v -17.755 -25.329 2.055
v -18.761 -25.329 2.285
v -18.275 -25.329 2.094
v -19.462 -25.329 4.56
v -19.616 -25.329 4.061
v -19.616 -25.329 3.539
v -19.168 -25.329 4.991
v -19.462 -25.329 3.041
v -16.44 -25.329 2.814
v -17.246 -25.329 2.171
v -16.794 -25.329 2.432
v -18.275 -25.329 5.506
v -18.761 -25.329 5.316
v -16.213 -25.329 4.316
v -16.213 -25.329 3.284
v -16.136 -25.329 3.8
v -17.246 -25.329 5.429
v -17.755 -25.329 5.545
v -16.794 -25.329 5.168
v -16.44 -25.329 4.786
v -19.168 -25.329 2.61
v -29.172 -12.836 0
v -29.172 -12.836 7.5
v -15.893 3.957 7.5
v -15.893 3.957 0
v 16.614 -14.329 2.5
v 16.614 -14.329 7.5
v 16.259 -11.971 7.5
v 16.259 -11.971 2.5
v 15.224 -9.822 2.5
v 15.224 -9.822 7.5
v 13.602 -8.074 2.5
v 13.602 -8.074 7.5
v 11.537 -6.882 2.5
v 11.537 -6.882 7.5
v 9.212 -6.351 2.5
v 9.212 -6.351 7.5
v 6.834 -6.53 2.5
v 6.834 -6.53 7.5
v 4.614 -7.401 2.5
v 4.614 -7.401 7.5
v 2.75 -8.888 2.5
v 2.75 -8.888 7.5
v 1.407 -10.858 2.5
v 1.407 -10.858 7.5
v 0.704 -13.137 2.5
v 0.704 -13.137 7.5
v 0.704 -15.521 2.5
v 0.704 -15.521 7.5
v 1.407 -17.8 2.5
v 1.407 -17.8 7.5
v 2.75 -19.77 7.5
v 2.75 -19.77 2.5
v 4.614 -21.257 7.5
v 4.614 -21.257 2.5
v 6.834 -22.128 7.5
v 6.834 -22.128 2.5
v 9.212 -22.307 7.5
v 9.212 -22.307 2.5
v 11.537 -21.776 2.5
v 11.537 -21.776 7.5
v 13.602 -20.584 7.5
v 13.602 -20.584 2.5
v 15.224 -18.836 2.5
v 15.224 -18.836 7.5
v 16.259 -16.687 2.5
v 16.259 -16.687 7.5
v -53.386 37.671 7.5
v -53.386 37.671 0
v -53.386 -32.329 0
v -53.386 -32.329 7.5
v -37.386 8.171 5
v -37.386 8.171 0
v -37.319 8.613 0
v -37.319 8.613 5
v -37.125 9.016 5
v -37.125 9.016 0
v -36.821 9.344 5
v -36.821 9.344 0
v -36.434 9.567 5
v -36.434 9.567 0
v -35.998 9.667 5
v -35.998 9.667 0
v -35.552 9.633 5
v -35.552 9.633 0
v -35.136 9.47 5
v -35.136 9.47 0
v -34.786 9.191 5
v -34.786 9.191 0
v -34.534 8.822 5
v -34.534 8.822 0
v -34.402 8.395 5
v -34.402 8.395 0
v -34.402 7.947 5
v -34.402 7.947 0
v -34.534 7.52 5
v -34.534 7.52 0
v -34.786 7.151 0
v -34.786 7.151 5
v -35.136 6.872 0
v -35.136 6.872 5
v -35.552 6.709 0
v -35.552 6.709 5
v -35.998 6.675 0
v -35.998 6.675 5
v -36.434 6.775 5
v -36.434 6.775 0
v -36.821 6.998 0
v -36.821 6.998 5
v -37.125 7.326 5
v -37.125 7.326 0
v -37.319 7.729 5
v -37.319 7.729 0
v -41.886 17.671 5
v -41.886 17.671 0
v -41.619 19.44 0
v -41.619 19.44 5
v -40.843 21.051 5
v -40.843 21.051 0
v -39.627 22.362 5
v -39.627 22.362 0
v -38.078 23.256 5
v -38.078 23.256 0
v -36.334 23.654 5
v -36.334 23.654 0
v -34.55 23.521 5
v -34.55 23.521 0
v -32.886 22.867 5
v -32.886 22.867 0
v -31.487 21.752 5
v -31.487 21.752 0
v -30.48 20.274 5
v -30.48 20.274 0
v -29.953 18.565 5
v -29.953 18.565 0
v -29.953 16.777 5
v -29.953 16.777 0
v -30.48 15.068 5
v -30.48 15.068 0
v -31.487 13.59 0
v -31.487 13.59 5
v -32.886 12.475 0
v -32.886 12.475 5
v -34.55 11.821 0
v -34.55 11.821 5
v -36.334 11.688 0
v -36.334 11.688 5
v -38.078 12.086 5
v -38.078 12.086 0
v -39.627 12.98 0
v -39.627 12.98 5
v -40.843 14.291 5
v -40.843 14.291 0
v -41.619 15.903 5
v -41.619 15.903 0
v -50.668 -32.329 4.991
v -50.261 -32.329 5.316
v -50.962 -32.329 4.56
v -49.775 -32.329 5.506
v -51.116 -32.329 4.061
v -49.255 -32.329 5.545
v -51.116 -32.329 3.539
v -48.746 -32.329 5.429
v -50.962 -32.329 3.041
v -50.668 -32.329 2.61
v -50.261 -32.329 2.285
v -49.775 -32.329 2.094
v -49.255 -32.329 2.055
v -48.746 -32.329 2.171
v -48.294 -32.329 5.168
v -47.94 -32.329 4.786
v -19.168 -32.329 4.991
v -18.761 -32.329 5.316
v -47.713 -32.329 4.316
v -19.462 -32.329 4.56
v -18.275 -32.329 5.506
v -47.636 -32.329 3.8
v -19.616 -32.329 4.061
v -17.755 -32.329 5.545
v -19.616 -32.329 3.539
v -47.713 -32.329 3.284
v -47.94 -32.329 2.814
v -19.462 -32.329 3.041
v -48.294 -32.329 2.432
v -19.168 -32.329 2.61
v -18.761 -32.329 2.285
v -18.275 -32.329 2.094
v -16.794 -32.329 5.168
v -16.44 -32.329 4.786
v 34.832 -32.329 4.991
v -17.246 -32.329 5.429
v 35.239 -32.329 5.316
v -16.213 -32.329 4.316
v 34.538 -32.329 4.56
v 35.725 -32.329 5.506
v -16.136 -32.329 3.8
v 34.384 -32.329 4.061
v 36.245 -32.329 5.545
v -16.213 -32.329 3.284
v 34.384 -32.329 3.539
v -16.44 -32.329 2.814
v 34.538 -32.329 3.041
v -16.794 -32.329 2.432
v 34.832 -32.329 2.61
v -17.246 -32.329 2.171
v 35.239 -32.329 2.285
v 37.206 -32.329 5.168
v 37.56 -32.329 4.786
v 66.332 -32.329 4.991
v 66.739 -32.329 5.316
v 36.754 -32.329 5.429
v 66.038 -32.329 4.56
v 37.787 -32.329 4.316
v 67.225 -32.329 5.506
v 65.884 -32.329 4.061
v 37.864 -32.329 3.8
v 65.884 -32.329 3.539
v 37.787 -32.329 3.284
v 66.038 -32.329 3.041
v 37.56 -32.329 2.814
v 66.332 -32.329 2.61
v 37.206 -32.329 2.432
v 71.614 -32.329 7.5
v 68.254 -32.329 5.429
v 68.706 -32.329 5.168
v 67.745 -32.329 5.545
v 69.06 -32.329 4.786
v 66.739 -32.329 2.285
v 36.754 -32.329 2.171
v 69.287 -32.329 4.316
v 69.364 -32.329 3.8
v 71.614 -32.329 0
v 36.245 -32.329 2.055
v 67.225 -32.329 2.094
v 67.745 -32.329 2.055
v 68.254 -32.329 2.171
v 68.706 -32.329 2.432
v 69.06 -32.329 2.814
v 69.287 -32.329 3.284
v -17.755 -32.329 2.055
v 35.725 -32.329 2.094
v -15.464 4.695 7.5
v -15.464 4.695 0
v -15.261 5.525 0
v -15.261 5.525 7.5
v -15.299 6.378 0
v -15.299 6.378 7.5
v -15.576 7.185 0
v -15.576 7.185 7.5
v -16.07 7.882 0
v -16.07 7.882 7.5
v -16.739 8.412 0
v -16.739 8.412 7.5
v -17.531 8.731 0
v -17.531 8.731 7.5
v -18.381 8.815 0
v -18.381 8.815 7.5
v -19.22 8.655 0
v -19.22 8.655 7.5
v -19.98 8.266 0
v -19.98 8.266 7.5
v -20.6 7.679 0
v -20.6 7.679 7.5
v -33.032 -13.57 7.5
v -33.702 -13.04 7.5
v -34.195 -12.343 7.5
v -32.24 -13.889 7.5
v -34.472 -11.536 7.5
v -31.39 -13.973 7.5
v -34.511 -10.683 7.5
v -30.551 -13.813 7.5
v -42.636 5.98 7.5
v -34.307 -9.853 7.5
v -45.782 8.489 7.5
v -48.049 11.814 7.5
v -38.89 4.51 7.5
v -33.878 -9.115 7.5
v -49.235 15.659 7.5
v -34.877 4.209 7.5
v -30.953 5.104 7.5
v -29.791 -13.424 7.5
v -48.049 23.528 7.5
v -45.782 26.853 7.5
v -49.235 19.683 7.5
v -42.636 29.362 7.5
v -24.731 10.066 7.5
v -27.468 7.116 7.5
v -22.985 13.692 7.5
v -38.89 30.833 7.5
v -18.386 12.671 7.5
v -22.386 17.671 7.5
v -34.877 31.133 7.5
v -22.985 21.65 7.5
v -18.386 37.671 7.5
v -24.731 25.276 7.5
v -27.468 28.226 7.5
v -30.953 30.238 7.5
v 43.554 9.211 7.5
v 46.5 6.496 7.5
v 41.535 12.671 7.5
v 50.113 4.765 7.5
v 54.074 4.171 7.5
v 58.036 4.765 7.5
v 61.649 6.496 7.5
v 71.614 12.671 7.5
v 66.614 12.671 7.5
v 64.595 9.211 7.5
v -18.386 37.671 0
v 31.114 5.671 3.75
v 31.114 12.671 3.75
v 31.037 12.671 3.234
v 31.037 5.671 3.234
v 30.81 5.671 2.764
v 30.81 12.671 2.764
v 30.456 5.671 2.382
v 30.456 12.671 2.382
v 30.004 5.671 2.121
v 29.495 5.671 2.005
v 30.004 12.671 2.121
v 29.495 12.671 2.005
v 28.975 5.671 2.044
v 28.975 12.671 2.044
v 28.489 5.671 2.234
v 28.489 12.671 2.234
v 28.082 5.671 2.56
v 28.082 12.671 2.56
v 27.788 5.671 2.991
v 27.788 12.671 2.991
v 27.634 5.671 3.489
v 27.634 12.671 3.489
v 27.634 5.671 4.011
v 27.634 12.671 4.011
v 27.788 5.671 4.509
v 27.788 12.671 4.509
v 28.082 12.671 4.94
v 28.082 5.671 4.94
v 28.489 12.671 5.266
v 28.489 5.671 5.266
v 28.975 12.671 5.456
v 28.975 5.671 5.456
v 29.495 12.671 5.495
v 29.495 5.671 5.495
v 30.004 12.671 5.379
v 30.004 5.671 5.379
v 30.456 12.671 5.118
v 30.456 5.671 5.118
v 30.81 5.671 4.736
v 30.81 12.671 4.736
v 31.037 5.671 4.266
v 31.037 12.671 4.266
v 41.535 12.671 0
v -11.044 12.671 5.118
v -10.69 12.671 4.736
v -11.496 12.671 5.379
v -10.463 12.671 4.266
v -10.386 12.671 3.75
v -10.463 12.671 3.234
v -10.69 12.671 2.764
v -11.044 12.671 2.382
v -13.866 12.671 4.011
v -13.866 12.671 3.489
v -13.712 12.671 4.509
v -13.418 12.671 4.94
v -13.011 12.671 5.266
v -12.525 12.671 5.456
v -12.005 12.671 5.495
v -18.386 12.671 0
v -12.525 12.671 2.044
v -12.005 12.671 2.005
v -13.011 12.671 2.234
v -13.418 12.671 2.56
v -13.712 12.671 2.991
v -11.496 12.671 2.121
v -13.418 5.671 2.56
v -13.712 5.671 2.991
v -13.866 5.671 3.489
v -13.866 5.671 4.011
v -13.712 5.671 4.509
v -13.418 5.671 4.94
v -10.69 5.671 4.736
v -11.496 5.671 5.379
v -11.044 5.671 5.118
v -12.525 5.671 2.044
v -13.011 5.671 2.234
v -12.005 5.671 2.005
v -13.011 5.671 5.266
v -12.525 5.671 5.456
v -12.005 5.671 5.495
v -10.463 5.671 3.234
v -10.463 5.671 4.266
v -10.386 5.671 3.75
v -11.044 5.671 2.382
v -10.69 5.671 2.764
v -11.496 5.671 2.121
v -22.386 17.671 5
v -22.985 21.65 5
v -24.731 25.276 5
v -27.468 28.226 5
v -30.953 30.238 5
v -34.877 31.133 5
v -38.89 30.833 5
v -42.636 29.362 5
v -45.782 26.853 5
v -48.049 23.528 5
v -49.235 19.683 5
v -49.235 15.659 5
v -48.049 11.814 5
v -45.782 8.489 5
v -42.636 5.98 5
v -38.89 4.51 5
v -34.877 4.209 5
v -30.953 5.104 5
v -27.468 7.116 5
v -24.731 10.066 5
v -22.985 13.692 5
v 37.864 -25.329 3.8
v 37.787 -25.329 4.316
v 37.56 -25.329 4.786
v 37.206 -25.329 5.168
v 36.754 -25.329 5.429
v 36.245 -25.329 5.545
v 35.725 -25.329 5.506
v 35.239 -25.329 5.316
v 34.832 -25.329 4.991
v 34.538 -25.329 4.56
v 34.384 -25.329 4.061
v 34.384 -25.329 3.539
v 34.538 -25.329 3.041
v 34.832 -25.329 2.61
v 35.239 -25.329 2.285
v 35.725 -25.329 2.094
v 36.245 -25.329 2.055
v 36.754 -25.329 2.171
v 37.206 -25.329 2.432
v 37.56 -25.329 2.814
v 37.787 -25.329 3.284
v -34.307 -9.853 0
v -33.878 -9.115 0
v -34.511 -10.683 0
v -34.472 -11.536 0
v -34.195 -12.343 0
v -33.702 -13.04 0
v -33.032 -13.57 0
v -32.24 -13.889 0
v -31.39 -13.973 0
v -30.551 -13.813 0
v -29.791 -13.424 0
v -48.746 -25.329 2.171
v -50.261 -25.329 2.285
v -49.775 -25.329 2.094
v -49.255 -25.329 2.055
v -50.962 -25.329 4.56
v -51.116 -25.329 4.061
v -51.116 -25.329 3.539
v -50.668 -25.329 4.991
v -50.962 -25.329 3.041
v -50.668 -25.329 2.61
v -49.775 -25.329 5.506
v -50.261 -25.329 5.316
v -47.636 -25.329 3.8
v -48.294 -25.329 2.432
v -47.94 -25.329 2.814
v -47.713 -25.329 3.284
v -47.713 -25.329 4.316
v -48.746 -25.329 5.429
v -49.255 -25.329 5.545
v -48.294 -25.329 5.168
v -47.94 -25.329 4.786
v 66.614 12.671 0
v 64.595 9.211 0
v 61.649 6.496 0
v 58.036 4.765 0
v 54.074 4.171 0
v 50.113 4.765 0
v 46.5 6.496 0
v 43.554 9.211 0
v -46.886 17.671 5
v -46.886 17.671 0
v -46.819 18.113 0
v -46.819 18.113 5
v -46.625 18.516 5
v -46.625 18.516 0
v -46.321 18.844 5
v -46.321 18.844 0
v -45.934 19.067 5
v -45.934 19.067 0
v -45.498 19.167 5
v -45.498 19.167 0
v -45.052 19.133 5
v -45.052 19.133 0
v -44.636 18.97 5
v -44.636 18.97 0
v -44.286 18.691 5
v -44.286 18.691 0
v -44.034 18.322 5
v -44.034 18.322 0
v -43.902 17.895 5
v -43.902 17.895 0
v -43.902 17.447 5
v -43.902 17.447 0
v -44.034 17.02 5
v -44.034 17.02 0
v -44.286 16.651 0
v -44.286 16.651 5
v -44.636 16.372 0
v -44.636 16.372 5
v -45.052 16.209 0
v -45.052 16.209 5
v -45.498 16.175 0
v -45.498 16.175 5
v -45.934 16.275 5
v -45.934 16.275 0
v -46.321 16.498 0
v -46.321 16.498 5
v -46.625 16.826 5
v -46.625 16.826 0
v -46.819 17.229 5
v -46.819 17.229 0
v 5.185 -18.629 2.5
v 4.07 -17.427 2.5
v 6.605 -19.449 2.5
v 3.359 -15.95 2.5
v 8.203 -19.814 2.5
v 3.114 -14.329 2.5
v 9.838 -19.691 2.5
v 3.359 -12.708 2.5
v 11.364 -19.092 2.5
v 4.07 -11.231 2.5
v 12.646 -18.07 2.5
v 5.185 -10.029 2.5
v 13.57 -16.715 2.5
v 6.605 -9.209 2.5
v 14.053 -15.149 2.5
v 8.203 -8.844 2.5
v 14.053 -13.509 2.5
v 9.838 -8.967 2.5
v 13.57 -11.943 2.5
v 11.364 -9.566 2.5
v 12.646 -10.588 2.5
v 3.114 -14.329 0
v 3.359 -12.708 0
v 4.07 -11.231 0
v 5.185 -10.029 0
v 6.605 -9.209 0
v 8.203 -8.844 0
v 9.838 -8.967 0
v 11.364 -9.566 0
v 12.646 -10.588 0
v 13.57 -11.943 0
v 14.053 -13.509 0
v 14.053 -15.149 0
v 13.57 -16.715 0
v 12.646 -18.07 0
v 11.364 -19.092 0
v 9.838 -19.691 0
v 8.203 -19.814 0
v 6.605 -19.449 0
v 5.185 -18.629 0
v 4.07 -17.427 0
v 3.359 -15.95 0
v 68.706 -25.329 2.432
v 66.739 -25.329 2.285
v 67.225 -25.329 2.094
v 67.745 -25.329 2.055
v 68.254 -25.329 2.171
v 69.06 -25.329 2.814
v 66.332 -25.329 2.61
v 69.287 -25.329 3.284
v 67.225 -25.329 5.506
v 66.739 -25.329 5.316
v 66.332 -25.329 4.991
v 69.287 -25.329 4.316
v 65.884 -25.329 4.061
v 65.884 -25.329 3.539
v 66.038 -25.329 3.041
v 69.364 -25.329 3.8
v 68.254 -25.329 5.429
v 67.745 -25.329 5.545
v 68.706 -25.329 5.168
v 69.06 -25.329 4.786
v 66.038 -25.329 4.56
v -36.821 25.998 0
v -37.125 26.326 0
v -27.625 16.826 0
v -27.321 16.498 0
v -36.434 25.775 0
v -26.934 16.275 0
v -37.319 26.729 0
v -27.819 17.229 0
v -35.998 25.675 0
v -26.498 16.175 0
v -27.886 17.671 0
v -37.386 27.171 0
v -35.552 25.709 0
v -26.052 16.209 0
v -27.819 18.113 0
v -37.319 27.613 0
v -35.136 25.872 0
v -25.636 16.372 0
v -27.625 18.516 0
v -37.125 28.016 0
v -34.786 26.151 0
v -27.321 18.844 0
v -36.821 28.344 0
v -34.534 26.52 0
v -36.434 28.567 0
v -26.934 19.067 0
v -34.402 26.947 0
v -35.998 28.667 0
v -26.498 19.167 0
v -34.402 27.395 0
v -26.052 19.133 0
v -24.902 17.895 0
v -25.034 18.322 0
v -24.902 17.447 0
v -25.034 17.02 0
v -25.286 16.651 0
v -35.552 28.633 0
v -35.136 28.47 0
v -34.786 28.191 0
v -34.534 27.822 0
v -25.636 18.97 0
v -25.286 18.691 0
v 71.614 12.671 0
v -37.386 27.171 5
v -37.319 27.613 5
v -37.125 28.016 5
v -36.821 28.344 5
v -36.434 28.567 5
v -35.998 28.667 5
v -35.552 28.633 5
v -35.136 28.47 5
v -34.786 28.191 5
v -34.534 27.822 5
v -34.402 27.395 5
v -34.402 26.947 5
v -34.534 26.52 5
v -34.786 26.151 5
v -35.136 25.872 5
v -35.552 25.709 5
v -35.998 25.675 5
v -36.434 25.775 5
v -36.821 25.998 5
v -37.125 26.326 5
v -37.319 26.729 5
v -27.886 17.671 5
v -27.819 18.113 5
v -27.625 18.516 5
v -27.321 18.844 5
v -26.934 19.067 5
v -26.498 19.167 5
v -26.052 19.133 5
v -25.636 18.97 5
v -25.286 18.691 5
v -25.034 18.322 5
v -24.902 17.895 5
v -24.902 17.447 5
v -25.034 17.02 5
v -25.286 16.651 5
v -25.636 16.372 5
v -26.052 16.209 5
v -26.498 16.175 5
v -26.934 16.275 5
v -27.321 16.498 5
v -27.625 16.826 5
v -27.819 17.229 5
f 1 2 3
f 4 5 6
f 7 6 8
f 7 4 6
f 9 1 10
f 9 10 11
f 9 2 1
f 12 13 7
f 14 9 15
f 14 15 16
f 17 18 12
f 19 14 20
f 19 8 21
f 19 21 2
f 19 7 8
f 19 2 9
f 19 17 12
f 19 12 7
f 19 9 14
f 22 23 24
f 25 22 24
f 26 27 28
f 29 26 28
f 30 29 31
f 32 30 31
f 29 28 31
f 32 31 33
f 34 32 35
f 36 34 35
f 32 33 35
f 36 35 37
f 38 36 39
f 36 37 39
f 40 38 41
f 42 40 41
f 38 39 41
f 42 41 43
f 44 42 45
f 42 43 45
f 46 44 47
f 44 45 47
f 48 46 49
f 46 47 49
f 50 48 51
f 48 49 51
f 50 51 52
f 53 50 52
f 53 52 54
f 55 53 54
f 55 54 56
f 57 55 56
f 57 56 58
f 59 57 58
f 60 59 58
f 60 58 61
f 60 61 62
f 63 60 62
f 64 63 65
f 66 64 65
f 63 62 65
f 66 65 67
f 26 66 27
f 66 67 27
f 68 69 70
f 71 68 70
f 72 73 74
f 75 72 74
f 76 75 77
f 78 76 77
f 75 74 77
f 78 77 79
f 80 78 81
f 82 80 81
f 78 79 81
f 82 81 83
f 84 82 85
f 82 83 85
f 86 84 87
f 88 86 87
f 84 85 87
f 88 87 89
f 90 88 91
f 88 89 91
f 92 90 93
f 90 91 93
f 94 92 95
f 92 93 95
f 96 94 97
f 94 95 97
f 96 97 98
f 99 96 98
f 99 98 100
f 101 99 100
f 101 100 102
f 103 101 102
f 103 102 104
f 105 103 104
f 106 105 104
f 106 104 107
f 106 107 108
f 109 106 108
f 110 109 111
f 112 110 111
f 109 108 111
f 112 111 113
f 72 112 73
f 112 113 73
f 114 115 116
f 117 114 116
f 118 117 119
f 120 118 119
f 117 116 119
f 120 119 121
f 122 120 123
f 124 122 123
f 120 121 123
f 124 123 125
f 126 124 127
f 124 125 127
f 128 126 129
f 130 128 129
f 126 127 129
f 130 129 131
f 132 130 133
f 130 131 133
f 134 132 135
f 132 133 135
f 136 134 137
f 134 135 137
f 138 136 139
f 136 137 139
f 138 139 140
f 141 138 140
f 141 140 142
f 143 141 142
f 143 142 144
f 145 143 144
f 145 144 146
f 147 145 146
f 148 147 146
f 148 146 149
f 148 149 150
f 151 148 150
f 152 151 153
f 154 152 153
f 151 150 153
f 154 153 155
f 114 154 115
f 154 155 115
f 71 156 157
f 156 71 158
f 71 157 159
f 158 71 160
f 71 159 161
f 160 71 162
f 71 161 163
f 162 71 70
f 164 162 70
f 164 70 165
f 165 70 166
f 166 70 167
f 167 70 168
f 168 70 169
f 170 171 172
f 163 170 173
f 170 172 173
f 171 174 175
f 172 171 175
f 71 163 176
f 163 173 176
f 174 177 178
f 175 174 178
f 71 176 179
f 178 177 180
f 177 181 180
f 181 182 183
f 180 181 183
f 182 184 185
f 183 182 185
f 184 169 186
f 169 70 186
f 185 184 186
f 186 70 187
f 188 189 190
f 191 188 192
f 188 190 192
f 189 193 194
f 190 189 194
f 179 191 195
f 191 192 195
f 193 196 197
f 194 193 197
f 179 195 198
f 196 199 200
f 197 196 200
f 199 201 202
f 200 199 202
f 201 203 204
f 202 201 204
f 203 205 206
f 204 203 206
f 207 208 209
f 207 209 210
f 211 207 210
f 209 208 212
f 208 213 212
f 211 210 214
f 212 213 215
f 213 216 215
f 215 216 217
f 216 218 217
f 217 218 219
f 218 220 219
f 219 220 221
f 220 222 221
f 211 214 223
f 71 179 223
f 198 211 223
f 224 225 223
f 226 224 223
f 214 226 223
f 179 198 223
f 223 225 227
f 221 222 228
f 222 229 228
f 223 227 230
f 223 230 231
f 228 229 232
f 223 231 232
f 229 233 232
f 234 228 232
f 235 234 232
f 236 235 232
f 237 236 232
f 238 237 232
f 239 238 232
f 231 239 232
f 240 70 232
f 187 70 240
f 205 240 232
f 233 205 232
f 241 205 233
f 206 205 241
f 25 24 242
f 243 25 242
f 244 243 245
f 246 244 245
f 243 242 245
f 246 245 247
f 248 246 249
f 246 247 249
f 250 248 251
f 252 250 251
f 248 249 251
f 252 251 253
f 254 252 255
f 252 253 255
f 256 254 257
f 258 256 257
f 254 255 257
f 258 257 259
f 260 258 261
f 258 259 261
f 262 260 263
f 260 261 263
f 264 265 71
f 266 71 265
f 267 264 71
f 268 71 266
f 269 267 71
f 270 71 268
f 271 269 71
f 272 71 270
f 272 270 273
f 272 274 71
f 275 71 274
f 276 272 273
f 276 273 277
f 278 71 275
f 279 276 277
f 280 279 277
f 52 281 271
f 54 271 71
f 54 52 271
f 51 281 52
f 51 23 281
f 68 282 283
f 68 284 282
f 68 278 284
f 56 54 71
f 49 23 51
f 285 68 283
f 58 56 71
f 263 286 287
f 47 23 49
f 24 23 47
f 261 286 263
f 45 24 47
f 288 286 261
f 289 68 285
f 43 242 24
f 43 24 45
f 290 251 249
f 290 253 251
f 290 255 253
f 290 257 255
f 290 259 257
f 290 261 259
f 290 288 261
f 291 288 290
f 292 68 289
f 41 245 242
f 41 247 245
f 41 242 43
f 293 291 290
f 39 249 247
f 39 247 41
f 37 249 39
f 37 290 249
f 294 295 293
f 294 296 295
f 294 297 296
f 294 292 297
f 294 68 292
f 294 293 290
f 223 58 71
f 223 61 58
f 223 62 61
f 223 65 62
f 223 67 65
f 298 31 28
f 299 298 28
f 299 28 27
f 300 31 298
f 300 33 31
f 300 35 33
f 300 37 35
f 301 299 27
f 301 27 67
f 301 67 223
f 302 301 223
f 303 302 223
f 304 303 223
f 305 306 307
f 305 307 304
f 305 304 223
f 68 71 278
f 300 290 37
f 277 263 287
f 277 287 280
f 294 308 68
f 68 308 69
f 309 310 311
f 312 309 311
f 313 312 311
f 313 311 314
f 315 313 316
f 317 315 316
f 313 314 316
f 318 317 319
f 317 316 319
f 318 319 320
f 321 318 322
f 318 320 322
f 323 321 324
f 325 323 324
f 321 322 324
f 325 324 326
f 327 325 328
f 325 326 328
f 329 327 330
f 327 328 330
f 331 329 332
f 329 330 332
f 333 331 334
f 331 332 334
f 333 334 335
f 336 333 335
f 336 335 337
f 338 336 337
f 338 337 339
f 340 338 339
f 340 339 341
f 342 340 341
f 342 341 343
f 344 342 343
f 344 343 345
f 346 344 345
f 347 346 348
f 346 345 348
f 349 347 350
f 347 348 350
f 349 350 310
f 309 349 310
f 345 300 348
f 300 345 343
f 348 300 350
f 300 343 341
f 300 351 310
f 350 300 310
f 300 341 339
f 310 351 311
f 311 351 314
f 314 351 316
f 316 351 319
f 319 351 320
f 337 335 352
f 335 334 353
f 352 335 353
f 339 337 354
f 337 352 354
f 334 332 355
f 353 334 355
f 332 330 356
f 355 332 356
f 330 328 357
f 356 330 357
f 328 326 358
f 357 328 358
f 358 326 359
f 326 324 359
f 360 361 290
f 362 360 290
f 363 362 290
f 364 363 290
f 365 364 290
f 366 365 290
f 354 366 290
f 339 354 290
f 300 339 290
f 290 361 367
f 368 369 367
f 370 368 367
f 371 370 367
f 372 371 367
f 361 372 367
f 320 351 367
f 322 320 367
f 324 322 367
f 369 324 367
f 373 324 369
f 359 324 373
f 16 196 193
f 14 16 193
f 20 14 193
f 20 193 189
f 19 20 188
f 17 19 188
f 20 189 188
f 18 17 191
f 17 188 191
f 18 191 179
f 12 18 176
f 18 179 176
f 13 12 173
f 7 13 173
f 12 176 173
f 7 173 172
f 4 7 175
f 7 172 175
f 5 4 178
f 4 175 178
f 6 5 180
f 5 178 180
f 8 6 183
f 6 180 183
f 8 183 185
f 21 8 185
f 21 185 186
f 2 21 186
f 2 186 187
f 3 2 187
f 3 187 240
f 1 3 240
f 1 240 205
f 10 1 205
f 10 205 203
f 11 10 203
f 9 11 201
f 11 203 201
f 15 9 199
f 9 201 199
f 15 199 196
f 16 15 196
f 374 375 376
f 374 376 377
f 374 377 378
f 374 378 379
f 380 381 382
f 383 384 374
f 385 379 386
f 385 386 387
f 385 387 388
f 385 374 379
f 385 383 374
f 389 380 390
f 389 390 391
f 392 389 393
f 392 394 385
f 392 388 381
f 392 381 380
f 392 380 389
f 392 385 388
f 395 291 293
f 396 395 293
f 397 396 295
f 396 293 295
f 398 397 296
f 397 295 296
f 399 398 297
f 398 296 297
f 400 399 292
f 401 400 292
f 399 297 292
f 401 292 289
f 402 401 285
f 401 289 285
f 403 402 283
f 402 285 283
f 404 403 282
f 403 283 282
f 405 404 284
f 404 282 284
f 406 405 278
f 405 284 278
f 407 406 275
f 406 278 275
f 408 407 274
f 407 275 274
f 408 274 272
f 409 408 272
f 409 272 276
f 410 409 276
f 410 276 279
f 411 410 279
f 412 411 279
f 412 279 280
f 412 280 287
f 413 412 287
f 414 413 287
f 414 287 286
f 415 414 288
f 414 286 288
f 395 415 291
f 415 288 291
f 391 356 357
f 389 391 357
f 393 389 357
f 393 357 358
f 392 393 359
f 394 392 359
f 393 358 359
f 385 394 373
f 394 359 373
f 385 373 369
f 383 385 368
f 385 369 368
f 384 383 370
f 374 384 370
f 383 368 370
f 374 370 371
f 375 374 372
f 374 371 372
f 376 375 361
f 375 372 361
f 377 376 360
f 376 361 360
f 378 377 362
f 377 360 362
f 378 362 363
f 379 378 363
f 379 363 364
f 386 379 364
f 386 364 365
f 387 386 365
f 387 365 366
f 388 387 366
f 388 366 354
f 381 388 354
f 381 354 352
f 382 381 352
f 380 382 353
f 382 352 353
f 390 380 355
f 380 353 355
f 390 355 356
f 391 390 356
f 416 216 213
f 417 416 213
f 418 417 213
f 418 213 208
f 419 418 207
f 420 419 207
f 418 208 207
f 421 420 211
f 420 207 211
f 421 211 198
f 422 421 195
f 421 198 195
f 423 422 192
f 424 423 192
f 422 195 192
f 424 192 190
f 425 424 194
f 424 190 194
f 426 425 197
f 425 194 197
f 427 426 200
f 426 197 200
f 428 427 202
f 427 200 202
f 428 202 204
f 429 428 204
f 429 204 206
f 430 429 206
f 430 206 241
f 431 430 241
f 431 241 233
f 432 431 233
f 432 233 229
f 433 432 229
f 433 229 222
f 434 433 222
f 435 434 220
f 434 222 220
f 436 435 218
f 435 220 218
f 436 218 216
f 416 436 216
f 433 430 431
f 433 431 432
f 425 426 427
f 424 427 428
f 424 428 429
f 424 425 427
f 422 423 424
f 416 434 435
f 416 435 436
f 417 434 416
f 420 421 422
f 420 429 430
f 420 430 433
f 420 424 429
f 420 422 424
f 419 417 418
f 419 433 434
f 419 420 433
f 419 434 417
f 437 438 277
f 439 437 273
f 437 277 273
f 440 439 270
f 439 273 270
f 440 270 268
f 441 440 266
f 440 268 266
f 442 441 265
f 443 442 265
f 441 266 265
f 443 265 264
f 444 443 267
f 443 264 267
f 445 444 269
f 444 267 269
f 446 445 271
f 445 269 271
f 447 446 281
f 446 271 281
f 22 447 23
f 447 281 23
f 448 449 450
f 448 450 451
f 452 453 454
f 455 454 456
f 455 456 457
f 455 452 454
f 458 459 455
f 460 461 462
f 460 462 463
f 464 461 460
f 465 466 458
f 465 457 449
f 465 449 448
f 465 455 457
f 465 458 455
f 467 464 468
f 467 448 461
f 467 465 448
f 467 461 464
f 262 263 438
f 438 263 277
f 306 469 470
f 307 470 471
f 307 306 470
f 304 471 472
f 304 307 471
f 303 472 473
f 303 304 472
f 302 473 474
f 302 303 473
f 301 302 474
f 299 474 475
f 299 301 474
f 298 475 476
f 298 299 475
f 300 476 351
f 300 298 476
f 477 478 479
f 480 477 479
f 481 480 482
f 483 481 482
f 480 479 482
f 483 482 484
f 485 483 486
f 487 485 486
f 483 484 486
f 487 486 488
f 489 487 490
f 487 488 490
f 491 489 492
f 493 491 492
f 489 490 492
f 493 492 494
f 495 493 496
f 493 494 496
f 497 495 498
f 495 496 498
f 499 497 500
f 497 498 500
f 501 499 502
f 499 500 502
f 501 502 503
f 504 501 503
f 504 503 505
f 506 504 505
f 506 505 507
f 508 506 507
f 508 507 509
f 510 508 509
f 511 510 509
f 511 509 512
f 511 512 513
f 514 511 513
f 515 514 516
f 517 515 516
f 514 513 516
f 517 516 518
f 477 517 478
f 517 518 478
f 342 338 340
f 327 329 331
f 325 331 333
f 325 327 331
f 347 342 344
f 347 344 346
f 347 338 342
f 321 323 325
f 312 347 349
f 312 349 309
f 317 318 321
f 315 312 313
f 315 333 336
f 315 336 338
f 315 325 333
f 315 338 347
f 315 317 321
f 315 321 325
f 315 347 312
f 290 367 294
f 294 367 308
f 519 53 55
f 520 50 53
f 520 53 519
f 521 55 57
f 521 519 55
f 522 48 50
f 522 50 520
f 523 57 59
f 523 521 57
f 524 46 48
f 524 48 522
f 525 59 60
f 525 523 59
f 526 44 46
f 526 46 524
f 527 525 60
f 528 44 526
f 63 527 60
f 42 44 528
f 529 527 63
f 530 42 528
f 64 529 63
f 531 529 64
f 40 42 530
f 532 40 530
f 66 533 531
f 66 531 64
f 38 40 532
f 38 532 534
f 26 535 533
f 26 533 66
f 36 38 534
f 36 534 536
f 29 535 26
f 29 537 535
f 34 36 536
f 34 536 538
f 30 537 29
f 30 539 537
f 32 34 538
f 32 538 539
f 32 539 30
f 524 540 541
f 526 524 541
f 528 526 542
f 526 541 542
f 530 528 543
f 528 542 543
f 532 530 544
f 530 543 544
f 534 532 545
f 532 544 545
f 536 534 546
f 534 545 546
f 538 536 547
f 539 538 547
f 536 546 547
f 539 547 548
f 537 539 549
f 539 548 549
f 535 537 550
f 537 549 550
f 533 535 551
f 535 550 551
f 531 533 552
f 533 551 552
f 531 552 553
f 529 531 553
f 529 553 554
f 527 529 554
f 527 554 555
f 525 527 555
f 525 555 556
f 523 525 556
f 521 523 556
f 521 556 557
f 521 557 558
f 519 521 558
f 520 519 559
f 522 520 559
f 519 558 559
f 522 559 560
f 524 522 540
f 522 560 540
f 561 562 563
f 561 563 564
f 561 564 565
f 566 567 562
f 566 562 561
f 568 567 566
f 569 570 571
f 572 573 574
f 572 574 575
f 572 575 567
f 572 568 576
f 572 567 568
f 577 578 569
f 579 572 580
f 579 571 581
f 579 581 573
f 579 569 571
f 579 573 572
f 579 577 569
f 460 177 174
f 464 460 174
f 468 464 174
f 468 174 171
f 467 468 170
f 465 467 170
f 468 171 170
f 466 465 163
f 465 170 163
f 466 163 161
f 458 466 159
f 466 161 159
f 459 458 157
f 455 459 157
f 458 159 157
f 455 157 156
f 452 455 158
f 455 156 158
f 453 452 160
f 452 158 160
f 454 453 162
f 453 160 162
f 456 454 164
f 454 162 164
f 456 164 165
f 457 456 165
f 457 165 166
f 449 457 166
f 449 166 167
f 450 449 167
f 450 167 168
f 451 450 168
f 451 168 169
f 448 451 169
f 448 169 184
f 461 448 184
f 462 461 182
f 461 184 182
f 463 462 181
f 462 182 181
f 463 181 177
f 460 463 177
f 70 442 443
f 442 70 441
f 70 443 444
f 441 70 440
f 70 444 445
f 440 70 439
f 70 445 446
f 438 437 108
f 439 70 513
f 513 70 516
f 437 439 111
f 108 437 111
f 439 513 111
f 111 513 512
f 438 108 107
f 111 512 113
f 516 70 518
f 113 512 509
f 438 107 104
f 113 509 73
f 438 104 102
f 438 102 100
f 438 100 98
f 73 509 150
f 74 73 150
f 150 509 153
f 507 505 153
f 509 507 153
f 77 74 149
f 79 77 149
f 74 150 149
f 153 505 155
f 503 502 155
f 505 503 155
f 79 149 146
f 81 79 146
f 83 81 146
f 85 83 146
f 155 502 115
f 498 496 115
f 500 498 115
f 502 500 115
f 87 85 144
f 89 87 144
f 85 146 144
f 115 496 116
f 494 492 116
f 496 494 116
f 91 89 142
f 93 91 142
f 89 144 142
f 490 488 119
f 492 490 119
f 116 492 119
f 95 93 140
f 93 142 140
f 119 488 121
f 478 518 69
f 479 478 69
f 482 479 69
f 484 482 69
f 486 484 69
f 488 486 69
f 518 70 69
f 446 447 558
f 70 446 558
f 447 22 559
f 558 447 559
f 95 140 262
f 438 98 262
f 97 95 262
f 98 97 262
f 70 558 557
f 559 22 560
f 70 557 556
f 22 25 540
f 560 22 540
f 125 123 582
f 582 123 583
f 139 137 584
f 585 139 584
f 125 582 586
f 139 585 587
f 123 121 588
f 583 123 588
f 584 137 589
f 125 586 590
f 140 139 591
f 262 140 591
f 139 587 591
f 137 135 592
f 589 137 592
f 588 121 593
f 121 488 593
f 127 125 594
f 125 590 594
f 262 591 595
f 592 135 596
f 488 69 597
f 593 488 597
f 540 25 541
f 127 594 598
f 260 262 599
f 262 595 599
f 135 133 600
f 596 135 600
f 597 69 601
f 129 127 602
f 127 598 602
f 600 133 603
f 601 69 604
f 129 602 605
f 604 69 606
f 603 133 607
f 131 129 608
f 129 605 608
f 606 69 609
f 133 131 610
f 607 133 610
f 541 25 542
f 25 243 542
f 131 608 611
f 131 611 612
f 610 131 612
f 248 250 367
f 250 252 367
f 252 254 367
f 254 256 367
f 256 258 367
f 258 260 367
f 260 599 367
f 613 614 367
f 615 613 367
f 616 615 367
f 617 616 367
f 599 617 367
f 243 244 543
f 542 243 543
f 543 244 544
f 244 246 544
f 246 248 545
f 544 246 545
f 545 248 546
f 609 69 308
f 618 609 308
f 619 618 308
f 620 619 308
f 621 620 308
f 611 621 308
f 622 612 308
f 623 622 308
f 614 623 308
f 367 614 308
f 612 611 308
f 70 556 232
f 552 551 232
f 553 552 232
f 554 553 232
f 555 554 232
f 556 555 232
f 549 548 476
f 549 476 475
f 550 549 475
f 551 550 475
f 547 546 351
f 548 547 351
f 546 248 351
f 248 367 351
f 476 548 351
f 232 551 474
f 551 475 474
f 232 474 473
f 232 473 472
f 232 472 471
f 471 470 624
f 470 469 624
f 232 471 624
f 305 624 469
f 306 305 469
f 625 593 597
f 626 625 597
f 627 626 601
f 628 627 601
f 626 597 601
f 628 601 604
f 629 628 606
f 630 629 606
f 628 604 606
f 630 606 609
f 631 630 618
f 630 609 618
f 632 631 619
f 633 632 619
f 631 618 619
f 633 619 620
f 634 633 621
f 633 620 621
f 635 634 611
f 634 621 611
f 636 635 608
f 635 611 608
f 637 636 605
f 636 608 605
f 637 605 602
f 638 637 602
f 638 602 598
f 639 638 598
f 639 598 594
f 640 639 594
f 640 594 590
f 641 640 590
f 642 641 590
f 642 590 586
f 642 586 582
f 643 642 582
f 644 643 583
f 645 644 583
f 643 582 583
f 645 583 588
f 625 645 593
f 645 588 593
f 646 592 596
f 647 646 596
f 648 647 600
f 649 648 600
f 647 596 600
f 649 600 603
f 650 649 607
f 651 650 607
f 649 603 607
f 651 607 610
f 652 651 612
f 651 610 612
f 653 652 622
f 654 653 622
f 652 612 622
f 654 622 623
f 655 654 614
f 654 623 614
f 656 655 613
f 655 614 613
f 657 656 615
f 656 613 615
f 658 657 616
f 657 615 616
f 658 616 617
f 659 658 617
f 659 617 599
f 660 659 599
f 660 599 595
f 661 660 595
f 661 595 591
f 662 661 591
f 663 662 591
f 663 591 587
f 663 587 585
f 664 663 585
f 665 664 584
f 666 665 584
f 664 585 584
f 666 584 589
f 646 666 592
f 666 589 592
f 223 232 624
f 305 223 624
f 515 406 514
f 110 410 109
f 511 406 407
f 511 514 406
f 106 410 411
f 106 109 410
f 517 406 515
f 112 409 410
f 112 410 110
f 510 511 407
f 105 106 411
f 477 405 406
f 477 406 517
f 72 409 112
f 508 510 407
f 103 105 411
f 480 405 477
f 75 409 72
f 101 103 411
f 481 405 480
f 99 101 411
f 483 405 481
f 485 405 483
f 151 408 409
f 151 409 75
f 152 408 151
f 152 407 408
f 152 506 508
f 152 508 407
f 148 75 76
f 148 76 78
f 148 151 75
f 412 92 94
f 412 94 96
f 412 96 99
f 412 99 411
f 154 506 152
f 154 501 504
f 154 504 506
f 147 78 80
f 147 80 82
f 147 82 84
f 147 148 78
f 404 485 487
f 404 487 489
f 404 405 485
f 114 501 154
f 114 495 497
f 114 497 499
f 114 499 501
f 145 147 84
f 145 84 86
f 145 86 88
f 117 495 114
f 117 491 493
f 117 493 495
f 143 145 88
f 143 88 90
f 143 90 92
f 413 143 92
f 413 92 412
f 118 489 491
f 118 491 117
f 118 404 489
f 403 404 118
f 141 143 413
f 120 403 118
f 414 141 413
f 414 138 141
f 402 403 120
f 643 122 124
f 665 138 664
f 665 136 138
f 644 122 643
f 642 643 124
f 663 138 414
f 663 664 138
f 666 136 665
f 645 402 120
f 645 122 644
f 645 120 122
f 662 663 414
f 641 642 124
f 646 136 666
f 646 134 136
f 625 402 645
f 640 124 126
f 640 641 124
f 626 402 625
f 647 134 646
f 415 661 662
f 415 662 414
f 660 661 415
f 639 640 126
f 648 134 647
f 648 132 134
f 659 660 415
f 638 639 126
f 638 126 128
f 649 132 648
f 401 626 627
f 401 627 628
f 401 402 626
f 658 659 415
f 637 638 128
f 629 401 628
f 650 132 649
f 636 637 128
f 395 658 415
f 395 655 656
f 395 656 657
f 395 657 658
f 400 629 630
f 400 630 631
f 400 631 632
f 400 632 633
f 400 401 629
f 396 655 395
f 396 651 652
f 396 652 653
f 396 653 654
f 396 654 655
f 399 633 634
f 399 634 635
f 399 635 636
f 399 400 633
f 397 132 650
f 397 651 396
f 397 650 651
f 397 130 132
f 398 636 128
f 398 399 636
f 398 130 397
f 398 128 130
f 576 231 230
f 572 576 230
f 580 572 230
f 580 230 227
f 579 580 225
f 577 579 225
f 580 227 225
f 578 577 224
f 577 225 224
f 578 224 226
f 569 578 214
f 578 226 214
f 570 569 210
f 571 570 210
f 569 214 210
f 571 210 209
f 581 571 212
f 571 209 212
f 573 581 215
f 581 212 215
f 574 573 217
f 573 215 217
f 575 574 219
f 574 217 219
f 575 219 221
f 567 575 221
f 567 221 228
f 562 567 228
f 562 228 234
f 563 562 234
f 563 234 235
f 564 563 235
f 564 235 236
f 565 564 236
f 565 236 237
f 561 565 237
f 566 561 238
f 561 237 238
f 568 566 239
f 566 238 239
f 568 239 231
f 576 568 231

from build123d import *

# Parameters (mm, degrees)
BOSS_EXTRU_1_DEPTH       = 7.5
REPOSE_MOTEUR_DEPTH      = 8
ESQUISSE5_R              = 8
FIXATION_COURROI_1_DEPTH = 5
ESQUISSE6_R              = 5.5
FIXATION_COURROI_2_DEPTH = 2.5
ESQUISSE3_R              = 1.5
ESQUISSE3_R_2            = 6
FIXATION_MOTEUR_1_DEPTH  = 5
ESQUISSE2_R              = 13.5
FIXATION_MOTEUR_2_DEPTH  = 2.5
ESQUISSE9_R              = 1.75
PERCAGE_1_DEPTH          = 7
ESQUISSE7_R              = 1.75
PERCAGE_2_DEPTH          = 7


with BuildPart() as part:
    # Esquisse1 → Boss.-Extru.1 (new body)
    with BuildSketch(Plane.XY):
        Polygon((-53.385579659, 37.671052632), (-53.385579659, -32.328947368), (71.614420341, -32.328947368), (71.614420341, 12.671052632), (-18.385579659, 12.671052632), (-18.385579659, 37.671052632), align=None)
    extrude(amount=BOSS_EXTRU_1_DEPTH)

    # Esquisse4 → Repose moteur (cut)
    with BuildSketch(Plane.XY.offset(7.5)):
        with BuildLine():
            Line((41.534547933, 12.671052632), (66.614420341, 12.671052632))
            ThreePointArc((66.614420341, 12.671052632), (54.074484137, 4.171052632), (41.534547933, 12.671052632))
        make_face()
        with BuildLine():
            Line((-20.599533185, 7.678512609), (-33.878119681, -9.114993842))
            ThreePointArc((-33.878119681, -9.114993842), (-33.385579659, -13.328947368), (-29.171626132, -12.836407346))
            Line((-29.171626132, -12.836407346), (-15.893039636, 3.957099105))
            ThreePointArc((-15.893039636, 3.957099105), (-16.385579659, 8.171052632), (-20.599533185, 7.678512609))
        make_face()
    extrude(amount=-REPOSE_MOTEUR_DEPTH, mode=Mode.SUBTRACT)

    # Esquisse5 → Fixation courroi 1 (cut)
    with BuildSketch(Plane.XY.offset(7.5)):
        with Locations((8.614420341, -14.328947368)):
            Circle(ESQUISSE5_R)
    extrude(amount=-FIXATION_COURROI_1_DEPTH, mode=Mode.SUBTRACT)

    # Esquisse6 → Fixation courroi 2 (cut)
    with BuildSketch(Plane(origin=(0, 0, 0), x_dir=(-1, 0, 0), z_dir=(0, 0, -1))):
        with Locations((-8.614420341, -14.328947368)):
            Circle(ESQUISSE6_R)
    extrude(amount=-FIXATION_COURROI_2_DEPTH, mode=Mode.SUBTRACT)

    # Esquisse3 → Fixation moteur 1 (cut)
    with BuildSketch(Plane(origin=(0, 0, 0), x_dir=(-1, 0, 0), z_dir=(0, 0, -1))):
        with Locations((45.385579659, 17.671052632)):
            Circle(ESQUISSE3_R)
        with Locations((35.885579659, 8.171052632)):
            Circle(ESQUISSE3_R)
        with Locations((26.385579659, 17.671052632)):
            Circle(ESQUISSE3_R)
        with Locations((35.885579659, 27.171052632)):
            Circle(ESQUISSE3_R)
        with Locations((35.885579659, 17.671052632)):
            Circle(ESQUISSE3_R_2)
    extrude(amount=-FIXATION_MOTEUR_1_DEPTH, mode=Mode.SUBTRACT)

    # Esquisse2 → Fixation moteur 2 (cut)
    with BuildSketch(Plane.XY.offset(7.5)):
        with Locations((-35.885579659, 17.671052632)):
            Circle(ESQUISSE2_R)
    extrude(amount=-FIXATION_MOTEUR_2_DEPTH, mode=Mode.SUBTRACT)

    # Esquisse9 → Percage 1 (cut)
    with BuildSketch(Plane(origin=(0, 12.671052632, 0), x_dir=(1, 0, 0), z_dir=(0, 1, 0))):
        with Locations((-12.135579659, -3.75)):
            Circle(ESQUISSE9_R)
        with Locations((29.364420341, -3.75)):
            Circle(ESQUISSE9_R)
    extrude(amount=-PERCAGE_1_DEPTH, mode=Mode.SUBTRACT)

    # Esquisse7 → Percage 2 (cut)
    with BuildSketch(Plane.XZ.offset(32.328947368)):
        with Locations((-49.385579659, 3.800276617)):
            Circle(ESQUISSE7_R)
        with Locations((-17.885579659, 3.800276617)):
            Circle(ESQUISSE7_R)
        with Locations((36.114420341, 3.800276617)):
            Circle(ESQUISSE7_R)
        with Locations((67.614420341, 3.800276617)):
            Circle(ESQUISSE7_R)
    extrude(amount=-PERCAGE_2_DEPTH, mode=Mode.SUBTRACT)


solid = part.part
